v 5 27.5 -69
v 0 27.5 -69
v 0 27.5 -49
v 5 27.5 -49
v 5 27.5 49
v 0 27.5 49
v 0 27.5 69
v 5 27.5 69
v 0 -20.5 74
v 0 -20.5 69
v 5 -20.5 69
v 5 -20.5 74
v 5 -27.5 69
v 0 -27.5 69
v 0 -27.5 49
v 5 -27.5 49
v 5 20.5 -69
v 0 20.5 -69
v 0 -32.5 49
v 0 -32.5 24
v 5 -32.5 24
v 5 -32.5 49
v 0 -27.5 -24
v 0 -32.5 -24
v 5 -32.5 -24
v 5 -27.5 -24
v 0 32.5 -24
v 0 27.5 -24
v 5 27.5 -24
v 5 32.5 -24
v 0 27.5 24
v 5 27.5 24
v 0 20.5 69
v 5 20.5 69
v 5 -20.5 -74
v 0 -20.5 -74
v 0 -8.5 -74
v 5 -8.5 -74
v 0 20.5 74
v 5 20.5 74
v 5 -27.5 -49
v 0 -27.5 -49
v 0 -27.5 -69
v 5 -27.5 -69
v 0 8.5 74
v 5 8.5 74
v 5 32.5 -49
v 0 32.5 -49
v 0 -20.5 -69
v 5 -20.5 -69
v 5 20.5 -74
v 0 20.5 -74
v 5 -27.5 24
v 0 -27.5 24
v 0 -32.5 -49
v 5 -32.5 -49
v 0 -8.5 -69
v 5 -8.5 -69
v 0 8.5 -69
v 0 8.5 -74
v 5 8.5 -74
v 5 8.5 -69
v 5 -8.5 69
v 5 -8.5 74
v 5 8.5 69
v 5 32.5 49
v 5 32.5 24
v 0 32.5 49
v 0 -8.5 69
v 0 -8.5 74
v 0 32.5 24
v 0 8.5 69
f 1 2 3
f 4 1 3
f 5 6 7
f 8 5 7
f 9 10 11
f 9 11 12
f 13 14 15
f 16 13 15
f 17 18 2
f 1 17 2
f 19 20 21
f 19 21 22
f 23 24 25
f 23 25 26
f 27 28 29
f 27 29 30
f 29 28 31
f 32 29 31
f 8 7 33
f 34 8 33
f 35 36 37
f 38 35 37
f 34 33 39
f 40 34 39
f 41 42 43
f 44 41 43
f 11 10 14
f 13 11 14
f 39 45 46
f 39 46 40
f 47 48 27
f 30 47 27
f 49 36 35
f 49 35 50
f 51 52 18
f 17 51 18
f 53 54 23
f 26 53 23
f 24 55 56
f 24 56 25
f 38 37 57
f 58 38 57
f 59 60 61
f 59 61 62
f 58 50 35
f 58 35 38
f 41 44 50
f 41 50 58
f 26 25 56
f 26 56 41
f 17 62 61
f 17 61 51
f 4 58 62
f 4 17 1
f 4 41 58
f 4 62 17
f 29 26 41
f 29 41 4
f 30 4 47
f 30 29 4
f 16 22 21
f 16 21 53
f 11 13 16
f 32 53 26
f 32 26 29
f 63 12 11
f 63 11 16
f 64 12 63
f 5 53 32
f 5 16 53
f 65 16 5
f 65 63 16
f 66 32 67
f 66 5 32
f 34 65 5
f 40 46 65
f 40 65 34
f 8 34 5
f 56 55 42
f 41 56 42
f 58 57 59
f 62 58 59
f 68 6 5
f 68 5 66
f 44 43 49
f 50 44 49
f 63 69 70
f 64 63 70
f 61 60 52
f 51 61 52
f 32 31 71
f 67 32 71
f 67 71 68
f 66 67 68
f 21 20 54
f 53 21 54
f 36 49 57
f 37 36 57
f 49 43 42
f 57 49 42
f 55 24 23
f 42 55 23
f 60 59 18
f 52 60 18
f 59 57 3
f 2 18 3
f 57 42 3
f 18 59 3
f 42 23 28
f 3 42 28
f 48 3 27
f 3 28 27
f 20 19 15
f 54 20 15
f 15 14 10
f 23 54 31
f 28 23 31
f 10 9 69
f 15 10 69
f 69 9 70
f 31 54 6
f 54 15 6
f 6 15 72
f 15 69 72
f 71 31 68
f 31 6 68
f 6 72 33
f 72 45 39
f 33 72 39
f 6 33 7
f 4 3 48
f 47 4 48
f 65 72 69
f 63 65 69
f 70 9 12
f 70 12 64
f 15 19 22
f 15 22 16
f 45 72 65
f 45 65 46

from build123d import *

# Parameters (mm, degrees)
F0_W     = 12
F0_H     = 5
F0_W_2   = 5
F0_H_2   = 25
F1_DEPTH = 5


with BuildPart() as f1:
    # F0 (on Right) → F1 (new body)
    with BuildSketch(Plane.YZ):
        Polygon((27.5, 49), (27.5, 69), (20.5, 69), (8.5, 69), (-8.5, 69), (-20.5, 69), (-27.5, 69), (-27.5, 49), (-27.5, 24), (-27.5, -24), (-27.5, -49), (-27.5, -69), (-20.5, -69), (-8.5, -69), (8.5, -69), (20.5, -69), (27.5, -69), (27.5, -49), (27.5, -24), (27.5, 24), align=None)
        with Locations((-14.5, 71.5)):
            Rectangle(F0_W, F0_H)
        with Locations((14.5, 71.5)):
            Rectangle(F0_W, F0_H)
        with Locations((30, 36.5)):
            Rectangle(F0_W_2, F0_H_2)
        with Locations((30, -36.5)):
            Rectangle(F0_W_2, F0_H_2)
        with Locations((14.5, -71.5)):
            Rectangle(F0_W, F0_H)
        with Locations((-14.5, -71.5)):
            Rectangle(F0_W, F0_H)
        with Locations((-30, -36.5)):
            Rectangle(F0_W_2, F0_H_2)
        with Locations((-30, 36.5)):
            Rectangle(F0_W_2, F0_H_2)
    extrude(amount=F1_DEPTH)


solid = f1.part
